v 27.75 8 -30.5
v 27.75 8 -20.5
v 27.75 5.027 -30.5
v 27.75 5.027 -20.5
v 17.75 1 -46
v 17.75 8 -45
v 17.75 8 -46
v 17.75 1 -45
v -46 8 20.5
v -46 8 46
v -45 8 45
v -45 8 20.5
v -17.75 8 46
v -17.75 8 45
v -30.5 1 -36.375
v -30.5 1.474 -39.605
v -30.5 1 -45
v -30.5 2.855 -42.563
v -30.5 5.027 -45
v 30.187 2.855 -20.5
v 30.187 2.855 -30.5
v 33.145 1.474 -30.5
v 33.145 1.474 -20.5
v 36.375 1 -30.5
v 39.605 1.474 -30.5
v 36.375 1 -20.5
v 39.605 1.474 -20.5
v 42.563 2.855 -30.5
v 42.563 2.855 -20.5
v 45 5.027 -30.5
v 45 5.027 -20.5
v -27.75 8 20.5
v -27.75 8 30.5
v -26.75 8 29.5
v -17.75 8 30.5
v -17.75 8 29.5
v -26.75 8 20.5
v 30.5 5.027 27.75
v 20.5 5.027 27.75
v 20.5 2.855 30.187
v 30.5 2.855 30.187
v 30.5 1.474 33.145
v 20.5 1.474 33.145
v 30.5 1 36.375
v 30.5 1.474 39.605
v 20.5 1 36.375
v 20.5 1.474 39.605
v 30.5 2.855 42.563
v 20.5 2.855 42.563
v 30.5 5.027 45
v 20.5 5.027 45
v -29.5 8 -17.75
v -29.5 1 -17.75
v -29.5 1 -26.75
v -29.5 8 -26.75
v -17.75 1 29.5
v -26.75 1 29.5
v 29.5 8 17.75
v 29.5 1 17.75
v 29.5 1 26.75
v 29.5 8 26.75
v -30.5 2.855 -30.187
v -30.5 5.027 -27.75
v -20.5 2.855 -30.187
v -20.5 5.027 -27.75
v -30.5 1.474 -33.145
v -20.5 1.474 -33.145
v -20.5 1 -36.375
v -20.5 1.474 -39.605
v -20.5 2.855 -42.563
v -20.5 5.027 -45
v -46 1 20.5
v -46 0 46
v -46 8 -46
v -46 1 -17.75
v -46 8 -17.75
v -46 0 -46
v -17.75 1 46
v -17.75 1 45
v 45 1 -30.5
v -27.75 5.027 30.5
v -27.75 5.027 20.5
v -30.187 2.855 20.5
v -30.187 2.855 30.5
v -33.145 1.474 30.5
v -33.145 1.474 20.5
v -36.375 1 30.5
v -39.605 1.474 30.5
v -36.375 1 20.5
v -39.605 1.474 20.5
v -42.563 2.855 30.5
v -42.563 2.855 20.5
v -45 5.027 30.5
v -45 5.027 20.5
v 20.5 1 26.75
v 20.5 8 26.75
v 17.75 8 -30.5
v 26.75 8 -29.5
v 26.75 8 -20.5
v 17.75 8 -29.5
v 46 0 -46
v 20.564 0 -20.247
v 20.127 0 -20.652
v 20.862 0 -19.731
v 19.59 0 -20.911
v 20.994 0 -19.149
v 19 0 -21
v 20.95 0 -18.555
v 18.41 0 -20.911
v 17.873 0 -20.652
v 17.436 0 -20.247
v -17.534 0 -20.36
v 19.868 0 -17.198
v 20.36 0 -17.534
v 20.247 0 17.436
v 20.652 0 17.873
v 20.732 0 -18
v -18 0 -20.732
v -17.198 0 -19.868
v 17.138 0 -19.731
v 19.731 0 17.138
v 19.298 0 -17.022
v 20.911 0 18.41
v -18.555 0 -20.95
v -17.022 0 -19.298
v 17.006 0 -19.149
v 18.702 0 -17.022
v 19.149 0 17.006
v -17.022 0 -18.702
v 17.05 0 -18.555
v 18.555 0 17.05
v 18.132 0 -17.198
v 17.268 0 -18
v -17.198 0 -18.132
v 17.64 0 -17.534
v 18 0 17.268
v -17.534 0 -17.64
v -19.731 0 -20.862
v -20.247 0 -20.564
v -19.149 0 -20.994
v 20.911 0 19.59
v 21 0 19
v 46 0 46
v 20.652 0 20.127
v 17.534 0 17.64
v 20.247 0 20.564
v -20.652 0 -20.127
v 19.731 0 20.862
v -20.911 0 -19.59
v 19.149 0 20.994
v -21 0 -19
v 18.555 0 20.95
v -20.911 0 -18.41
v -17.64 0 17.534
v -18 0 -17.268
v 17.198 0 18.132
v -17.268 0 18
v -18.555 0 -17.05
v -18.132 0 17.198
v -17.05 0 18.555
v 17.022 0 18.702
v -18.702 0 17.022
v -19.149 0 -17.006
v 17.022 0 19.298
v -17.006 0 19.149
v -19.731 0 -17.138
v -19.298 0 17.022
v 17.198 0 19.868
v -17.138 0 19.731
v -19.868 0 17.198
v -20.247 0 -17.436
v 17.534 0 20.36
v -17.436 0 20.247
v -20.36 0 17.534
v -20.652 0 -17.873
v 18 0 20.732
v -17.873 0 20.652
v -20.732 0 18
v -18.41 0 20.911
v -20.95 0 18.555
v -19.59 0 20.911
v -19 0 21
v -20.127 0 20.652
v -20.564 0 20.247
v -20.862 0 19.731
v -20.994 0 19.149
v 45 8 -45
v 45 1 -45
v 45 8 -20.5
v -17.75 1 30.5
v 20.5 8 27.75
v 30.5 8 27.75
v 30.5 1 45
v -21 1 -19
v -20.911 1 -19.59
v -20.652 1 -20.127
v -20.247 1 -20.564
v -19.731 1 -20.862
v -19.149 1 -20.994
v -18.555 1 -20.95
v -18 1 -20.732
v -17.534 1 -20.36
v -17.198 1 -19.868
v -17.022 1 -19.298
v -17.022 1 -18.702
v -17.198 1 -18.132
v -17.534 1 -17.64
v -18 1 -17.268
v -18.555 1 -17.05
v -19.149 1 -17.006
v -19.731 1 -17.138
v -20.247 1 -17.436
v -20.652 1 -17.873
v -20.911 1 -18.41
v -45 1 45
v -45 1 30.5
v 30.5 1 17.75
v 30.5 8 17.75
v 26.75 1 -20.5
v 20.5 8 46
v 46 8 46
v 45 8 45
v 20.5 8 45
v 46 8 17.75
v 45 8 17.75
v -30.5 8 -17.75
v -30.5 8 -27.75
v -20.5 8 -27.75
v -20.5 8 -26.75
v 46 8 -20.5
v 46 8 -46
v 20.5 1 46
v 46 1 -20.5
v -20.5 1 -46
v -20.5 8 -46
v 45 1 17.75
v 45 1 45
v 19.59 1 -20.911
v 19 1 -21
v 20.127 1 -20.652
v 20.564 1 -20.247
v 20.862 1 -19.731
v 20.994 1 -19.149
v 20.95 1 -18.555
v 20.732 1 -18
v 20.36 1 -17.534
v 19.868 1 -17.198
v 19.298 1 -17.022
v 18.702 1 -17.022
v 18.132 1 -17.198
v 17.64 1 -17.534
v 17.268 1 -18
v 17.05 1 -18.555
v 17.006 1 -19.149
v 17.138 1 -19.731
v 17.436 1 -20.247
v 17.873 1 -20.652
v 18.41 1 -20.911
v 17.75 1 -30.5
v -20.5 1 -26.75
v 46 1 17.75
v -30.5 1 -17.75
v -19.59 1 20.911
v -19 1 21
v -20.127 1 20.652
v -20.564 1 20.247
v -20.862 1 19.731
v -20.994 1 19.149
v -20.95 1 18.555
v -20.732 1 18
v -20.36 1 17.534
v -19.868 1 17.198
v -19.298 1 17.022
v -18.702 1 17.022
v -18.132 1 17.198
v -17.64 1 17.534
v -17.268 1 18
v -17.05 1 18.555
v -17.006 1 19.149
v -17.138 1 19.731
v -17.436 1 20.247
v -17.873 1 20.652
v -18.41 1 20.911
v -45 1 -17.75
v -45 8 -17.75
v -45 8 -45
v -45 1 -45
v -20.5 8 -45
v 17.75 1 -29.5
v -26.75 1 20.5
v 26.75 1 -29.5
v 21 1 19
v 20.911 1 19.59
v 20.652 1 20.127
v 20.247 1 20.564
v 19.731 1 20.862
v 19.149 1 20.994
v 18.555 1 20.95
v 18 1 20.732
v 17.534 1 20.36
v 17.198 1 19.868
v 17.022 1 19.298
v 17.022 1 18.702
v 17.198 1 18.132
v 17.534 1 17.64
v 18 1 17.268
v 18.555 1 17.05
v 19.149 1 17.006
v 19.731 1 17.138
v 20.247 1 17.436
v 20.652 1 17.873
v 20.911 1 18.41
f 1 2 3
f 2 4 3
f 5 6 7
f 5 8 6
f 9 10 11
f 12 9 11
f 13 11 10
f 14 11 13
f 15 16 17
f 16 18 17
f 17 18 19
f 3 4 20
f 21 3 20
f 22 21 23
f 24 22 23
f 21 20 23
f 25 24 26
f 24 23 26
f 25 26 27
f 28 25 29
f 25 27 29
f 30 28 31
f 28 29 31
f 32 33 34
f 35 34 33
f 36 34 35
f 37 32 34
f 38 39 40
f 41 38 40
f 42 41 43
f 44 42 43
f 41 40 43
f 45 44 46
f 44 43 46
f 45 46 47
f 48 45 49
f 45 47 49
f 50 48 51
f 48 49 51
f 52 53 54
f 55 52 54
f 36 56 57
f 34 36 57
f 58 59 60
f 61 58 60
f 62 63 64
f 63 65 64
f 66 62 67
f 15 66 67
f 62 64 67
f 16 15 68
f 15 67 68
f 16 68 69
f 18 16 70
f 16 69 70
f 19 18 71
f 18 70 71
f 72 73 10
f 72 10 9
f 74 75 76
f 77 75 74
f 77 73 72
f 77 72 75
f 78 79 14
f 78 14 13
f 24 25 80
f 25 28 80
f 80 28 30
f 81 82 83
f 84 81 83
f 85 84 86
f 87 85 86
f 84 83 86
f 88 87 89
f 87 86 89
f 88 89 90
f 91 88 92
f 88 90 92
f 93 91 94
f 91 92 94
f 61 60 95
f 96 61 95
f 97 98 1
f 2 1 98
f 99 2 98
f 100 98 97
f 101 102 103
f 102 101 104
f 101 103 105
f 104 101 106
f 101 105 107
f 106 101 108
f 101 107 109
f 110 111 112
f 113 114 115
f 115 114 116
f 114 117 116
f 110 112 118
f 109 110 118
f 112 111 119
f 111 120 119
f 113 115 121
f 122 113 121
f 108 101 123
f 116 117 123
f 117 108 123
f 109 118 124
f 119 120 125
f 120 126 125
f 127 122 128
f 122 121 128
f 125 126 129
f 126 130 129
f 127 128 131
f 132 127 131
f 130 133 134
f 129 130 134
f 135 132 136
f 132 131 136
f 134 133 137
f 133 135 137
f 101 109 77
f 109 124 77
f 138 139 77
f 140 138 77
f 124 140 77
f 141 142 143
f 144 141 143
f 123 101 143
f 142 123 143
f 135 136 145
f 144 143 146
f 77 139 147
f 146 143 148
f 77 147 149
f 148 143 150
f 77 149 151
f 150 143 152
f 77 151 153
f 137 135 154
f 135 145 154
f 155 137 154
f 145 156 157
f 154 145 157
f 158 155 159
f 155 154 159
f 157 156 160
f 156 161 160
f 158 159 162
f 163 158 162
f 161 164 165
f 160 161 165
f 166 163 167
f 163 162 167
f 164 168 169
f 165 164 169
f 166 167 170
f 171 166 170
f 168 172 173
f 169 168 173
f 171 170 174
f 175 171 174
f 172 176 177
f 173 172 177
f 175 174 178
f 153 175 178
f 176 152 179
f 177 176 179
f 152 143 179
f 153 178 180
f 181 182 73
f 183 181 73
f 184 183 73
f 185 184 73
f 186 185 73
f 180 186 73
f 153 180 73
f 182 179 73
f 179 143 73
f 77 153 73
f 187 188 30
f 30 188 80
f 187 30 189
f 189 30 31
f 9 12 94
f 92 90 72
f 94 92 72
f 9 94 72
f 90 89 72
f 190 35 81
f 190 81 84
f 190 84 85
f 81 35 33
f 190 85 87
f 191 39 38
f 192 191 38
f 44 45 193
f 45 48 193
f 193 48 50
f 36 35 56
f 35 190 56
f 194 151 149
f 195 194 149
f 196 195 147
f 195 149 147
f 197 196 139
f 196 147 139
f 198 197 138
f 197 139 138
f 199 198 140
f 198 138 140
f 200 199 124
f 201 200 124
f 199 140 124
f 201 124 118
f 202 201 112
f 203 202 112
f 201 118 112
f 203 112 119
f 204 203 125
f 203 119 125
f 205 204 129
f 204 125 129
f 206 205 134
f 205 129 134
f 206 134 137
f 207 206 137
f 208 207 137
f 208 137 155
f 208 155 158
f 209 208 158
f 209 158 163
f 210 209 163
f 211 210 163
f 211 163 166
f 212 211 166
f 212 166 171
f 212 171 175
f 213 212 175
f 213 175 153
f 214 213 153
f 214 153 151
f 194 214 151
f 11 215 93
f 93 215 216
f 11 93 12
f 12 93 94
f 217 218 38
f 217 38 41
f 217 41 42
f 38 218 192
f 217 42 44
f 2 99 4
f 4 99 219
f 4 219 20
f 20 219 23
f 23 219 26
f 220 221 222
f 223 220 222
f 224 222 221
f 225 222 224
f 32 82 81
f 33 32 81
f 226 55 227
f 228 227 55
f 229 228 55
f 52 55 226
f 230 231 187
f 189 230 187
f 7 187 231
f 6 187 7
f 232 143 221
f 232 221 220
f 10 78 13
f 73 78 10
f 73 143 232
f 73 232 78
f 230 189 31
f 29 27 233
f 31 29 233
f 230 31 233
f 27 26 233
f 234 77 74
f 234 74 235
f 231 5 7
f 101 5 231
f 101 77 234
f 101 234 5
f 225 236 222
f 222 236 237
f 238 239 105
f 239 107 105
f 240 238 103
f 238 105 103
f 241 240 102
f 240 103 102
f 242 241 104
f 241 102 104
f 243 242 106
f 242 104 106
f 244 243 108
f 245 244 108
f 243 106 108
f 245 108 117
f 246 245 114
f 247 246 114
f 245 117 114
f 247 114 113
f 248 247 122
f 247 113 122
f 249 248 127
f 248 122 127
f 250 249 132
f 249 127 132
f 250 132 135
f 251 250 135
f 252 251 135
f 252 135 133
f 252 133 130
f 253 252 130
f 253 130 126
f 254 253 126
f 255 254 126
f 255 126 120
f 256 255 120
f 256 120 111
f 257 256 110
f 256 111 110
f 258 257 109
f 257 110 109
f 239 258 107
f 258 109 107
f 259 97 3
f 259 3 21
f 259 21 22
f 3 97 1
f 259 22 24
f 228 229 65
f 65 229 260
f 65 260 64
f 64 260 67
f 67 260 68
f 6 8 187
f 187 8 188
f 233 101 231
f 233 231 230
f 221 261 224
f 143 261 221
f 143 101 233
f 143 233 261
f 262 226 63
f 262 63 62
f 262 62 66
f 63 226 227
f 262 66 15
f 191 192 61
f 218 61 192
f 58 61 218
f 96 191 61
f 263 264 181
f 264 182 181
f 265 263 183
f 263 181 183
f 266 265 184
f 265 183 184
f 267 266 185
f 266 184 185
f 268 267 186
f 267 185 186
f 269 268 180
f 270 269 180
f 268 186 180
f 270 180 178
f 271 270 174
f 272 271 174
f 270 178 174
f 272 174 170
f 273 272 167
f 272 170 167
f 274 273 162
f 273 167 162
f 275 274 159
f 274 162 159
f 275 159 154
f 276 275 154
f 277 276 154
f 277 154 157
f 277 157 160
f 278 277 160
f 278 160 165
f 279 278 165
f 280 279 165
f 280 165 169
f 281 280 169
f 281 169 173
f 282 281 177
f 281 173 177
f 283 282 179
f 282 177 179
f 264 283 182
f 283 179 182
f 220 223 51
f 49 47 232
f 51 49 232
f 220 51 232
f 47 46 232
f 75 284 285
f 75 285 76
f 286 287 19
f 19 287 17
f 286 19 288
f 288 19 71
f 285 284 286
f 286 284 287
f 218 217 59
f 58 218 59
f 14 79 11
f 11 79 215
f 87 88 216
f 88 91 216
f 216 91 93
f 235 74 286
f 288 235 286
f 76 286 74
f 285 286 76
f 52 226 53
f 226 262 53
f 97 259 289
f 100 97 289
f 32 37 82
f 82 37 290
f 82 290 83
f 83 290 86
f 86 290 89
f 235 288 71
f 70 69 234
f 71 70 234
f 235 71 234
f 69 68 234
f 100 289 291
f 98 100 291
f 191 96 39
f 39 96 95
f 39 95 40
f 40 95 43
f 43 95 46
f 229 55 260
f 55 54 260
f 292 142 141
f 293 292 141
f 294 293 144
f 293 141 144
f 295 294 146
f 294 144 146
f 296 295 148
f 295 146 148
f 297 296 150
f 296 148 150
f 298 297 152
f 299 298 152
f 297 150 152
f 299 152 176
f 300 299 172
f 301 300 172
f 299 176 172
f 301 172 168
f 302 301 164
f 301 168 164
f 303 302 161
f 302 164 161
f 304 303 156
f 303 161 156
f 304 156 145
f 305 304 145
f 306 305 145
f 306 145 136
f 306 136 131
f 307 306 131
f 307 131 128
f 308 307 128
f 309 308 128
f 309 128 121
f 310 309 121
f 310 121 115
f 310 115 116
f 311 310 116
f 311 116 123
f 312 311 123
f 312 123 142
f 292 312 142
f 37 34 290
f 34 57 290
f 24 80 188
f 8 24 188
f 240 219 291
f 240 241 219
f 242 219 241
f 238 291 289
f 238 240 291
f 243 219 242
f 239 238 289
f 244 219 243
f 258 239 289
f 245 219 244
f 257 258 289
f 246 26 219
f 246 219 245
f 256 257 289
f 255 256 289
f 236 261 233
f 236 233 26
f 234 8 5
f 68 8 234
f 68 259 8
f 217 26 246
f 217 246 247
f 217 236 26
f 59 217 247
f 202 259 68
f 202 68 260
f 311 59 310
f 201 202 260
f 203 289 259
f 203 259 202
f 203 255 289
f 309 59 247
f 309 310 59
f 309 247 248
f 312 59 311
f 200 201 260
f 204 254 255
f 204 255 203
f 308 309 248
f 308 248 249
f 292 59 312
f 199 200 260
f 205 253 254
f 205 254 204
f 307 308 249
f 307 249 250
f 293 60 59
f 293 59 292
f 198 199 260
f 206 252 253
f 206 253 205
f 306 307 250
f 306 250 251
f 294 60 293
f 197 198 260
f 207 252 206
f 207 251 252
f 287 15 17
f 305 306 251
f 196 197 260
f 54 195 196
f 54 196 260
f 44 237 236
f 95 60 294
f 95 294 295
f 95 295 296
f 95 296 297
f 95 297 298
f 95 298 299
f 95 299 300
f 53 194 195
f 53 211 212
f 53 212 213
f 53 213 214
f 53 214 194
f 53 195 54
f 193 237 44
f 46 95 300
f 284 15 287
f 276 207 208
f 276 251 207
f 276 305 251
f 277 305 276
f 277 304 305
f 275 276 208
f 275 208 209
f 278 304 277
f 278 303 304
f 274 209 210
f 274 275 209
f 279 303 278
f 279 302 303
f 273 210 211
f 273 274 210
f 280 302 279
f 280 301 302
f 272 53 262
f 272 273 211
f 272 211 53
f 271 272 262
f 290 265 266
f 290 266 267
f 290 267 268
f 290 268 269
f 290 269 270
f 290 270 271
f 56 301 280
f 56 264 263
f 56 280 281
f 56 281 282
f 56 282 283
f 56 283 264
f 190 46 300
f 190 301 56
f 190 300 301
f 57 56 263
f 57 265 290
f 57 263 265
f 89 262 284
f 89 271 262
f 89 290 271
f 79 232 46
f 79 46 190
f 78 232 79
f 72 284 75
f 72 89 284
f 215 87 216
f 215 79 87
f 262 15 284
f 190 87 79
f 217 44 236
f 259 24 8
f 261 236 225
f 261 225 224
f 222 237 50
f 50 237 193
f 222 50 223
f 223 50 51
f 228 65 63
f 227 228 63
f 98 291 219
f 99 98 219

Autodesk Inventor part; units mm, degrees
ref_plane "YZ Plane" through (0, 0, 0) normal (1, 0, 0) x (0, 1, 0)
ref_plane "XZ Plane" through (0, 0, 0) normal (0, 1, 0) x (-1, 0, 0)
ref_plane "XY Plane" through (0, 0, 0) normal (0, 0, 1) x (1, 0, 0)
sketch "Sketch1" plane through (0, 0, 0) normal (0, 1, 0) x (-1, 0, 0)
  line L0 (45, 45) -> (-45, 45)
  line L1 (-45, 45) -> (-45, -45)
  line L2 (-45, -45) -> (45, -45)
  line L3 (45, -45) -> (45, 45)
  line L4 (45, 45) -> (-45, -45) construction
  line L5 (-45, 45) -> (45, -45) construction
  line L6 (-46, 46) -> (46, 46)
  line L7 (46, 46) -> (46, -46)
  line L8 (46, -46) -> (-46, -46)
  line L9 (-46, -46) -> (-46, 46)
  line L10 (-46, 46) -> (46, -46) construction
  line L11 (46, 46) -> (-46, -46) construction
  point P0 (0, 0)
  dimension "d0" = 90
  dimension "d1" = 90
  dimension "d2" = 92
  dimension "d3" = 92
extrude "Extrusion1" add sketch "Sketch1" along normal blind 1 contours L3 L2 L1 L0 | L6 L7 L8 L9
sketch "Sketch2" plane through (0, 1, 0) normal (0, 1, 0) x (1, 0, 0)
  line L0 (-46, -46) -> (46, -46) projected
  line L1 (46, -46) -> (46, 46) projected
  line L2 (46, 46) -> (-46, 46) projected
  line L3 (-46, 46) -> (-46, -46) projected
  line L4 (45, 45) -> (-45, 45)
  line L5 (-45, -20.5) -> (-45, -45)
  line L6 (-45, -45) -> (-17.75, -45)
  line L7 (45, -45) -> (45, 45)
  line L8 (45, 45) -> (-45, -45) construction
  line L9 (-45, 45) -> (45, -45) construction
  line L10 (-27.75, -30.5) -> (-17.75, -30.5)
  line L11 (-17.75, -30.5) -> (-17.75, -29.5)
  line L12 (-17.75, -29.5) -> (-27.75, -29.5)
  line L13 (-27.75, -29.5) -> (-27.75, -30.5)
  line L14 (-27.75, -30.5) -> (-26.75, -30.5)
  line L15 (-26.75, -30.5) -> (-26.75, -20.5)
  line L16 (-26.75, -20.5) -> (-27.75, -20.5)
  line L17 (-27.75, -20.5) -> (-27.75, -30.5)
  line L18 (-17.75, -45) -> (-17.75, -46)
  line L19 (-46, -46) -> (46, -46) projected
  line L20 (-45, -20.5) -> (-46, -20.5)
  point P0 (0, 0)
  dimension "d6" = 90
  dimension "d7" = 90
  dimension "d8" = 1
  dimension "d9" = 1
  dimension "d10" = 10
  dimension "d11" = 10
  dimension "d12" = 14.5
  dimension "d13" = 17.25
sketch "Sketch3" plane through (0, 1, 0) normal (0, 1, 0) x (1, 0, 0)
  line L0 (-27.75, -30.5) -> (-17.75, -30.5) projected
  line L1 (-27.75, -20.5) -> (-27.75, -30.5) projected
  line L2 (-26.75, -30.5) -> (-26.75, -20.5) projected
  line L3 (-17.75, -29.5) -> (-27.75, -29.5) projected
  line L4 (-26.75, -20.5) -> (-27.75, -20.5) projected
  line L5 (-17.75, -45) -> (-17.75, -46) projected
  line L6 (-45, -20.5) -> (-46, -20.5) projected
  line L7 (-46, 46) -> (-46, -46) projected
  line L8 (-45, -20.5) -> (-46, -20.5)
  line L9 (-46, -20.5) -> (-46, -46)
  line L10 (-46, -46) -> (-45, -46)
  line L11 (-45, -46) -> (-45, -20.5)
  line L12 (-46, -46) -> (46, -46) projected
  line L13 (-46, -46) -> (-17.75, -46)
  line L14 (-17.75, -46) -> (-17.75, -45)
  line L15 (-17.75, -45) -> (-46, -45)
  line L16 (-46, -45) -> (-46, -46)
  line L17 (-27.75, -30.5) -> (-17.75, -30.5)
  line L18 (-17.75, -30.5) -> (-17.75, -29.5)
  line L19 (-17.75, -29.5) -> (-27.75, -29.5)
  line L20 (-27.75, -29.5) -> (-27.75, -30.5)
  point P0 (0, 0)
extrude "Extrusion2" add sketch "Sketch3" along normal blind 7
sketch "Sketch4" plane through (-45, 1, 20.5) normal (0, 0, -1) x (-1, 0, 0)
  line L0 (-17.25, 0) -> (-18.25, 0) projected
  line L1 (-17.25, 0) -> (-17.25, 7) projected
  line L2 (-18.25, 7) -> (-17.25, 7) projected
  line L3 (-18.25, 0) -> (-18.25, 7) projected
  line L4 (1, 0) -> (0, 0) projected
  line L5 (1, 0) -> (1, 7) projected
  line L6 (0, 7) -> (1, 7) projected
  line L7 (0, 0) -> (0, 7) projected
  line L8 (0, 0) -> (-27.25, 0) projected
  arc A0 (-17.25, 4.027) -> (0, 4.027) centre (-8.625, 11.25) ccw
  line L9 (-91, 0) -> (1, 0) projected
  line L10 (-17.25, 0) -> (-17.25, 7) projected
  line L11 (-8.625, 0) -> (-17.25, 0)
  line L12 (-17.25, 0) -> (-17.25, 4.027)
  line L13 (0, 0) -> (0, 7) projected
  line L14 (-8.625, 0) -> (0, 0)
  line L15 (0, 0) -> (0, 4.027)
  point P0 (-45, -1)
  dimension "d16" = 22.5
  dimension "d17" = 8.625
extrude "Extrusion3" add sketch "Sketch4" against normal blind 10 contours A0 L7 L8 | L1 A0 L8
sketch "Sketch5" plane through (0, 1, 0) normal (0, 1, 0) x (1, 0, 0)
  line L0 (-17.75, -46) -> (46, -46) projected
  line L1 (-46, -20.5) -> (-46, -46) projected
  point P0 (0, 0)
  point P1 (-19, -19)
  dimension "d23" = 27
  dimension "d24" = 27
hole "Hole1" at (-19, 1, 19) direction (0, -1, 0) diameter 4 end through all
pattern_circular "Circular Pattern2" count 4 over 360 about axis through (0, -10, 0) along (0, 1, 0) of "Extrusion2", "Extrusion3", "Hole1"
properties part number "motor_mount_base1_template"
